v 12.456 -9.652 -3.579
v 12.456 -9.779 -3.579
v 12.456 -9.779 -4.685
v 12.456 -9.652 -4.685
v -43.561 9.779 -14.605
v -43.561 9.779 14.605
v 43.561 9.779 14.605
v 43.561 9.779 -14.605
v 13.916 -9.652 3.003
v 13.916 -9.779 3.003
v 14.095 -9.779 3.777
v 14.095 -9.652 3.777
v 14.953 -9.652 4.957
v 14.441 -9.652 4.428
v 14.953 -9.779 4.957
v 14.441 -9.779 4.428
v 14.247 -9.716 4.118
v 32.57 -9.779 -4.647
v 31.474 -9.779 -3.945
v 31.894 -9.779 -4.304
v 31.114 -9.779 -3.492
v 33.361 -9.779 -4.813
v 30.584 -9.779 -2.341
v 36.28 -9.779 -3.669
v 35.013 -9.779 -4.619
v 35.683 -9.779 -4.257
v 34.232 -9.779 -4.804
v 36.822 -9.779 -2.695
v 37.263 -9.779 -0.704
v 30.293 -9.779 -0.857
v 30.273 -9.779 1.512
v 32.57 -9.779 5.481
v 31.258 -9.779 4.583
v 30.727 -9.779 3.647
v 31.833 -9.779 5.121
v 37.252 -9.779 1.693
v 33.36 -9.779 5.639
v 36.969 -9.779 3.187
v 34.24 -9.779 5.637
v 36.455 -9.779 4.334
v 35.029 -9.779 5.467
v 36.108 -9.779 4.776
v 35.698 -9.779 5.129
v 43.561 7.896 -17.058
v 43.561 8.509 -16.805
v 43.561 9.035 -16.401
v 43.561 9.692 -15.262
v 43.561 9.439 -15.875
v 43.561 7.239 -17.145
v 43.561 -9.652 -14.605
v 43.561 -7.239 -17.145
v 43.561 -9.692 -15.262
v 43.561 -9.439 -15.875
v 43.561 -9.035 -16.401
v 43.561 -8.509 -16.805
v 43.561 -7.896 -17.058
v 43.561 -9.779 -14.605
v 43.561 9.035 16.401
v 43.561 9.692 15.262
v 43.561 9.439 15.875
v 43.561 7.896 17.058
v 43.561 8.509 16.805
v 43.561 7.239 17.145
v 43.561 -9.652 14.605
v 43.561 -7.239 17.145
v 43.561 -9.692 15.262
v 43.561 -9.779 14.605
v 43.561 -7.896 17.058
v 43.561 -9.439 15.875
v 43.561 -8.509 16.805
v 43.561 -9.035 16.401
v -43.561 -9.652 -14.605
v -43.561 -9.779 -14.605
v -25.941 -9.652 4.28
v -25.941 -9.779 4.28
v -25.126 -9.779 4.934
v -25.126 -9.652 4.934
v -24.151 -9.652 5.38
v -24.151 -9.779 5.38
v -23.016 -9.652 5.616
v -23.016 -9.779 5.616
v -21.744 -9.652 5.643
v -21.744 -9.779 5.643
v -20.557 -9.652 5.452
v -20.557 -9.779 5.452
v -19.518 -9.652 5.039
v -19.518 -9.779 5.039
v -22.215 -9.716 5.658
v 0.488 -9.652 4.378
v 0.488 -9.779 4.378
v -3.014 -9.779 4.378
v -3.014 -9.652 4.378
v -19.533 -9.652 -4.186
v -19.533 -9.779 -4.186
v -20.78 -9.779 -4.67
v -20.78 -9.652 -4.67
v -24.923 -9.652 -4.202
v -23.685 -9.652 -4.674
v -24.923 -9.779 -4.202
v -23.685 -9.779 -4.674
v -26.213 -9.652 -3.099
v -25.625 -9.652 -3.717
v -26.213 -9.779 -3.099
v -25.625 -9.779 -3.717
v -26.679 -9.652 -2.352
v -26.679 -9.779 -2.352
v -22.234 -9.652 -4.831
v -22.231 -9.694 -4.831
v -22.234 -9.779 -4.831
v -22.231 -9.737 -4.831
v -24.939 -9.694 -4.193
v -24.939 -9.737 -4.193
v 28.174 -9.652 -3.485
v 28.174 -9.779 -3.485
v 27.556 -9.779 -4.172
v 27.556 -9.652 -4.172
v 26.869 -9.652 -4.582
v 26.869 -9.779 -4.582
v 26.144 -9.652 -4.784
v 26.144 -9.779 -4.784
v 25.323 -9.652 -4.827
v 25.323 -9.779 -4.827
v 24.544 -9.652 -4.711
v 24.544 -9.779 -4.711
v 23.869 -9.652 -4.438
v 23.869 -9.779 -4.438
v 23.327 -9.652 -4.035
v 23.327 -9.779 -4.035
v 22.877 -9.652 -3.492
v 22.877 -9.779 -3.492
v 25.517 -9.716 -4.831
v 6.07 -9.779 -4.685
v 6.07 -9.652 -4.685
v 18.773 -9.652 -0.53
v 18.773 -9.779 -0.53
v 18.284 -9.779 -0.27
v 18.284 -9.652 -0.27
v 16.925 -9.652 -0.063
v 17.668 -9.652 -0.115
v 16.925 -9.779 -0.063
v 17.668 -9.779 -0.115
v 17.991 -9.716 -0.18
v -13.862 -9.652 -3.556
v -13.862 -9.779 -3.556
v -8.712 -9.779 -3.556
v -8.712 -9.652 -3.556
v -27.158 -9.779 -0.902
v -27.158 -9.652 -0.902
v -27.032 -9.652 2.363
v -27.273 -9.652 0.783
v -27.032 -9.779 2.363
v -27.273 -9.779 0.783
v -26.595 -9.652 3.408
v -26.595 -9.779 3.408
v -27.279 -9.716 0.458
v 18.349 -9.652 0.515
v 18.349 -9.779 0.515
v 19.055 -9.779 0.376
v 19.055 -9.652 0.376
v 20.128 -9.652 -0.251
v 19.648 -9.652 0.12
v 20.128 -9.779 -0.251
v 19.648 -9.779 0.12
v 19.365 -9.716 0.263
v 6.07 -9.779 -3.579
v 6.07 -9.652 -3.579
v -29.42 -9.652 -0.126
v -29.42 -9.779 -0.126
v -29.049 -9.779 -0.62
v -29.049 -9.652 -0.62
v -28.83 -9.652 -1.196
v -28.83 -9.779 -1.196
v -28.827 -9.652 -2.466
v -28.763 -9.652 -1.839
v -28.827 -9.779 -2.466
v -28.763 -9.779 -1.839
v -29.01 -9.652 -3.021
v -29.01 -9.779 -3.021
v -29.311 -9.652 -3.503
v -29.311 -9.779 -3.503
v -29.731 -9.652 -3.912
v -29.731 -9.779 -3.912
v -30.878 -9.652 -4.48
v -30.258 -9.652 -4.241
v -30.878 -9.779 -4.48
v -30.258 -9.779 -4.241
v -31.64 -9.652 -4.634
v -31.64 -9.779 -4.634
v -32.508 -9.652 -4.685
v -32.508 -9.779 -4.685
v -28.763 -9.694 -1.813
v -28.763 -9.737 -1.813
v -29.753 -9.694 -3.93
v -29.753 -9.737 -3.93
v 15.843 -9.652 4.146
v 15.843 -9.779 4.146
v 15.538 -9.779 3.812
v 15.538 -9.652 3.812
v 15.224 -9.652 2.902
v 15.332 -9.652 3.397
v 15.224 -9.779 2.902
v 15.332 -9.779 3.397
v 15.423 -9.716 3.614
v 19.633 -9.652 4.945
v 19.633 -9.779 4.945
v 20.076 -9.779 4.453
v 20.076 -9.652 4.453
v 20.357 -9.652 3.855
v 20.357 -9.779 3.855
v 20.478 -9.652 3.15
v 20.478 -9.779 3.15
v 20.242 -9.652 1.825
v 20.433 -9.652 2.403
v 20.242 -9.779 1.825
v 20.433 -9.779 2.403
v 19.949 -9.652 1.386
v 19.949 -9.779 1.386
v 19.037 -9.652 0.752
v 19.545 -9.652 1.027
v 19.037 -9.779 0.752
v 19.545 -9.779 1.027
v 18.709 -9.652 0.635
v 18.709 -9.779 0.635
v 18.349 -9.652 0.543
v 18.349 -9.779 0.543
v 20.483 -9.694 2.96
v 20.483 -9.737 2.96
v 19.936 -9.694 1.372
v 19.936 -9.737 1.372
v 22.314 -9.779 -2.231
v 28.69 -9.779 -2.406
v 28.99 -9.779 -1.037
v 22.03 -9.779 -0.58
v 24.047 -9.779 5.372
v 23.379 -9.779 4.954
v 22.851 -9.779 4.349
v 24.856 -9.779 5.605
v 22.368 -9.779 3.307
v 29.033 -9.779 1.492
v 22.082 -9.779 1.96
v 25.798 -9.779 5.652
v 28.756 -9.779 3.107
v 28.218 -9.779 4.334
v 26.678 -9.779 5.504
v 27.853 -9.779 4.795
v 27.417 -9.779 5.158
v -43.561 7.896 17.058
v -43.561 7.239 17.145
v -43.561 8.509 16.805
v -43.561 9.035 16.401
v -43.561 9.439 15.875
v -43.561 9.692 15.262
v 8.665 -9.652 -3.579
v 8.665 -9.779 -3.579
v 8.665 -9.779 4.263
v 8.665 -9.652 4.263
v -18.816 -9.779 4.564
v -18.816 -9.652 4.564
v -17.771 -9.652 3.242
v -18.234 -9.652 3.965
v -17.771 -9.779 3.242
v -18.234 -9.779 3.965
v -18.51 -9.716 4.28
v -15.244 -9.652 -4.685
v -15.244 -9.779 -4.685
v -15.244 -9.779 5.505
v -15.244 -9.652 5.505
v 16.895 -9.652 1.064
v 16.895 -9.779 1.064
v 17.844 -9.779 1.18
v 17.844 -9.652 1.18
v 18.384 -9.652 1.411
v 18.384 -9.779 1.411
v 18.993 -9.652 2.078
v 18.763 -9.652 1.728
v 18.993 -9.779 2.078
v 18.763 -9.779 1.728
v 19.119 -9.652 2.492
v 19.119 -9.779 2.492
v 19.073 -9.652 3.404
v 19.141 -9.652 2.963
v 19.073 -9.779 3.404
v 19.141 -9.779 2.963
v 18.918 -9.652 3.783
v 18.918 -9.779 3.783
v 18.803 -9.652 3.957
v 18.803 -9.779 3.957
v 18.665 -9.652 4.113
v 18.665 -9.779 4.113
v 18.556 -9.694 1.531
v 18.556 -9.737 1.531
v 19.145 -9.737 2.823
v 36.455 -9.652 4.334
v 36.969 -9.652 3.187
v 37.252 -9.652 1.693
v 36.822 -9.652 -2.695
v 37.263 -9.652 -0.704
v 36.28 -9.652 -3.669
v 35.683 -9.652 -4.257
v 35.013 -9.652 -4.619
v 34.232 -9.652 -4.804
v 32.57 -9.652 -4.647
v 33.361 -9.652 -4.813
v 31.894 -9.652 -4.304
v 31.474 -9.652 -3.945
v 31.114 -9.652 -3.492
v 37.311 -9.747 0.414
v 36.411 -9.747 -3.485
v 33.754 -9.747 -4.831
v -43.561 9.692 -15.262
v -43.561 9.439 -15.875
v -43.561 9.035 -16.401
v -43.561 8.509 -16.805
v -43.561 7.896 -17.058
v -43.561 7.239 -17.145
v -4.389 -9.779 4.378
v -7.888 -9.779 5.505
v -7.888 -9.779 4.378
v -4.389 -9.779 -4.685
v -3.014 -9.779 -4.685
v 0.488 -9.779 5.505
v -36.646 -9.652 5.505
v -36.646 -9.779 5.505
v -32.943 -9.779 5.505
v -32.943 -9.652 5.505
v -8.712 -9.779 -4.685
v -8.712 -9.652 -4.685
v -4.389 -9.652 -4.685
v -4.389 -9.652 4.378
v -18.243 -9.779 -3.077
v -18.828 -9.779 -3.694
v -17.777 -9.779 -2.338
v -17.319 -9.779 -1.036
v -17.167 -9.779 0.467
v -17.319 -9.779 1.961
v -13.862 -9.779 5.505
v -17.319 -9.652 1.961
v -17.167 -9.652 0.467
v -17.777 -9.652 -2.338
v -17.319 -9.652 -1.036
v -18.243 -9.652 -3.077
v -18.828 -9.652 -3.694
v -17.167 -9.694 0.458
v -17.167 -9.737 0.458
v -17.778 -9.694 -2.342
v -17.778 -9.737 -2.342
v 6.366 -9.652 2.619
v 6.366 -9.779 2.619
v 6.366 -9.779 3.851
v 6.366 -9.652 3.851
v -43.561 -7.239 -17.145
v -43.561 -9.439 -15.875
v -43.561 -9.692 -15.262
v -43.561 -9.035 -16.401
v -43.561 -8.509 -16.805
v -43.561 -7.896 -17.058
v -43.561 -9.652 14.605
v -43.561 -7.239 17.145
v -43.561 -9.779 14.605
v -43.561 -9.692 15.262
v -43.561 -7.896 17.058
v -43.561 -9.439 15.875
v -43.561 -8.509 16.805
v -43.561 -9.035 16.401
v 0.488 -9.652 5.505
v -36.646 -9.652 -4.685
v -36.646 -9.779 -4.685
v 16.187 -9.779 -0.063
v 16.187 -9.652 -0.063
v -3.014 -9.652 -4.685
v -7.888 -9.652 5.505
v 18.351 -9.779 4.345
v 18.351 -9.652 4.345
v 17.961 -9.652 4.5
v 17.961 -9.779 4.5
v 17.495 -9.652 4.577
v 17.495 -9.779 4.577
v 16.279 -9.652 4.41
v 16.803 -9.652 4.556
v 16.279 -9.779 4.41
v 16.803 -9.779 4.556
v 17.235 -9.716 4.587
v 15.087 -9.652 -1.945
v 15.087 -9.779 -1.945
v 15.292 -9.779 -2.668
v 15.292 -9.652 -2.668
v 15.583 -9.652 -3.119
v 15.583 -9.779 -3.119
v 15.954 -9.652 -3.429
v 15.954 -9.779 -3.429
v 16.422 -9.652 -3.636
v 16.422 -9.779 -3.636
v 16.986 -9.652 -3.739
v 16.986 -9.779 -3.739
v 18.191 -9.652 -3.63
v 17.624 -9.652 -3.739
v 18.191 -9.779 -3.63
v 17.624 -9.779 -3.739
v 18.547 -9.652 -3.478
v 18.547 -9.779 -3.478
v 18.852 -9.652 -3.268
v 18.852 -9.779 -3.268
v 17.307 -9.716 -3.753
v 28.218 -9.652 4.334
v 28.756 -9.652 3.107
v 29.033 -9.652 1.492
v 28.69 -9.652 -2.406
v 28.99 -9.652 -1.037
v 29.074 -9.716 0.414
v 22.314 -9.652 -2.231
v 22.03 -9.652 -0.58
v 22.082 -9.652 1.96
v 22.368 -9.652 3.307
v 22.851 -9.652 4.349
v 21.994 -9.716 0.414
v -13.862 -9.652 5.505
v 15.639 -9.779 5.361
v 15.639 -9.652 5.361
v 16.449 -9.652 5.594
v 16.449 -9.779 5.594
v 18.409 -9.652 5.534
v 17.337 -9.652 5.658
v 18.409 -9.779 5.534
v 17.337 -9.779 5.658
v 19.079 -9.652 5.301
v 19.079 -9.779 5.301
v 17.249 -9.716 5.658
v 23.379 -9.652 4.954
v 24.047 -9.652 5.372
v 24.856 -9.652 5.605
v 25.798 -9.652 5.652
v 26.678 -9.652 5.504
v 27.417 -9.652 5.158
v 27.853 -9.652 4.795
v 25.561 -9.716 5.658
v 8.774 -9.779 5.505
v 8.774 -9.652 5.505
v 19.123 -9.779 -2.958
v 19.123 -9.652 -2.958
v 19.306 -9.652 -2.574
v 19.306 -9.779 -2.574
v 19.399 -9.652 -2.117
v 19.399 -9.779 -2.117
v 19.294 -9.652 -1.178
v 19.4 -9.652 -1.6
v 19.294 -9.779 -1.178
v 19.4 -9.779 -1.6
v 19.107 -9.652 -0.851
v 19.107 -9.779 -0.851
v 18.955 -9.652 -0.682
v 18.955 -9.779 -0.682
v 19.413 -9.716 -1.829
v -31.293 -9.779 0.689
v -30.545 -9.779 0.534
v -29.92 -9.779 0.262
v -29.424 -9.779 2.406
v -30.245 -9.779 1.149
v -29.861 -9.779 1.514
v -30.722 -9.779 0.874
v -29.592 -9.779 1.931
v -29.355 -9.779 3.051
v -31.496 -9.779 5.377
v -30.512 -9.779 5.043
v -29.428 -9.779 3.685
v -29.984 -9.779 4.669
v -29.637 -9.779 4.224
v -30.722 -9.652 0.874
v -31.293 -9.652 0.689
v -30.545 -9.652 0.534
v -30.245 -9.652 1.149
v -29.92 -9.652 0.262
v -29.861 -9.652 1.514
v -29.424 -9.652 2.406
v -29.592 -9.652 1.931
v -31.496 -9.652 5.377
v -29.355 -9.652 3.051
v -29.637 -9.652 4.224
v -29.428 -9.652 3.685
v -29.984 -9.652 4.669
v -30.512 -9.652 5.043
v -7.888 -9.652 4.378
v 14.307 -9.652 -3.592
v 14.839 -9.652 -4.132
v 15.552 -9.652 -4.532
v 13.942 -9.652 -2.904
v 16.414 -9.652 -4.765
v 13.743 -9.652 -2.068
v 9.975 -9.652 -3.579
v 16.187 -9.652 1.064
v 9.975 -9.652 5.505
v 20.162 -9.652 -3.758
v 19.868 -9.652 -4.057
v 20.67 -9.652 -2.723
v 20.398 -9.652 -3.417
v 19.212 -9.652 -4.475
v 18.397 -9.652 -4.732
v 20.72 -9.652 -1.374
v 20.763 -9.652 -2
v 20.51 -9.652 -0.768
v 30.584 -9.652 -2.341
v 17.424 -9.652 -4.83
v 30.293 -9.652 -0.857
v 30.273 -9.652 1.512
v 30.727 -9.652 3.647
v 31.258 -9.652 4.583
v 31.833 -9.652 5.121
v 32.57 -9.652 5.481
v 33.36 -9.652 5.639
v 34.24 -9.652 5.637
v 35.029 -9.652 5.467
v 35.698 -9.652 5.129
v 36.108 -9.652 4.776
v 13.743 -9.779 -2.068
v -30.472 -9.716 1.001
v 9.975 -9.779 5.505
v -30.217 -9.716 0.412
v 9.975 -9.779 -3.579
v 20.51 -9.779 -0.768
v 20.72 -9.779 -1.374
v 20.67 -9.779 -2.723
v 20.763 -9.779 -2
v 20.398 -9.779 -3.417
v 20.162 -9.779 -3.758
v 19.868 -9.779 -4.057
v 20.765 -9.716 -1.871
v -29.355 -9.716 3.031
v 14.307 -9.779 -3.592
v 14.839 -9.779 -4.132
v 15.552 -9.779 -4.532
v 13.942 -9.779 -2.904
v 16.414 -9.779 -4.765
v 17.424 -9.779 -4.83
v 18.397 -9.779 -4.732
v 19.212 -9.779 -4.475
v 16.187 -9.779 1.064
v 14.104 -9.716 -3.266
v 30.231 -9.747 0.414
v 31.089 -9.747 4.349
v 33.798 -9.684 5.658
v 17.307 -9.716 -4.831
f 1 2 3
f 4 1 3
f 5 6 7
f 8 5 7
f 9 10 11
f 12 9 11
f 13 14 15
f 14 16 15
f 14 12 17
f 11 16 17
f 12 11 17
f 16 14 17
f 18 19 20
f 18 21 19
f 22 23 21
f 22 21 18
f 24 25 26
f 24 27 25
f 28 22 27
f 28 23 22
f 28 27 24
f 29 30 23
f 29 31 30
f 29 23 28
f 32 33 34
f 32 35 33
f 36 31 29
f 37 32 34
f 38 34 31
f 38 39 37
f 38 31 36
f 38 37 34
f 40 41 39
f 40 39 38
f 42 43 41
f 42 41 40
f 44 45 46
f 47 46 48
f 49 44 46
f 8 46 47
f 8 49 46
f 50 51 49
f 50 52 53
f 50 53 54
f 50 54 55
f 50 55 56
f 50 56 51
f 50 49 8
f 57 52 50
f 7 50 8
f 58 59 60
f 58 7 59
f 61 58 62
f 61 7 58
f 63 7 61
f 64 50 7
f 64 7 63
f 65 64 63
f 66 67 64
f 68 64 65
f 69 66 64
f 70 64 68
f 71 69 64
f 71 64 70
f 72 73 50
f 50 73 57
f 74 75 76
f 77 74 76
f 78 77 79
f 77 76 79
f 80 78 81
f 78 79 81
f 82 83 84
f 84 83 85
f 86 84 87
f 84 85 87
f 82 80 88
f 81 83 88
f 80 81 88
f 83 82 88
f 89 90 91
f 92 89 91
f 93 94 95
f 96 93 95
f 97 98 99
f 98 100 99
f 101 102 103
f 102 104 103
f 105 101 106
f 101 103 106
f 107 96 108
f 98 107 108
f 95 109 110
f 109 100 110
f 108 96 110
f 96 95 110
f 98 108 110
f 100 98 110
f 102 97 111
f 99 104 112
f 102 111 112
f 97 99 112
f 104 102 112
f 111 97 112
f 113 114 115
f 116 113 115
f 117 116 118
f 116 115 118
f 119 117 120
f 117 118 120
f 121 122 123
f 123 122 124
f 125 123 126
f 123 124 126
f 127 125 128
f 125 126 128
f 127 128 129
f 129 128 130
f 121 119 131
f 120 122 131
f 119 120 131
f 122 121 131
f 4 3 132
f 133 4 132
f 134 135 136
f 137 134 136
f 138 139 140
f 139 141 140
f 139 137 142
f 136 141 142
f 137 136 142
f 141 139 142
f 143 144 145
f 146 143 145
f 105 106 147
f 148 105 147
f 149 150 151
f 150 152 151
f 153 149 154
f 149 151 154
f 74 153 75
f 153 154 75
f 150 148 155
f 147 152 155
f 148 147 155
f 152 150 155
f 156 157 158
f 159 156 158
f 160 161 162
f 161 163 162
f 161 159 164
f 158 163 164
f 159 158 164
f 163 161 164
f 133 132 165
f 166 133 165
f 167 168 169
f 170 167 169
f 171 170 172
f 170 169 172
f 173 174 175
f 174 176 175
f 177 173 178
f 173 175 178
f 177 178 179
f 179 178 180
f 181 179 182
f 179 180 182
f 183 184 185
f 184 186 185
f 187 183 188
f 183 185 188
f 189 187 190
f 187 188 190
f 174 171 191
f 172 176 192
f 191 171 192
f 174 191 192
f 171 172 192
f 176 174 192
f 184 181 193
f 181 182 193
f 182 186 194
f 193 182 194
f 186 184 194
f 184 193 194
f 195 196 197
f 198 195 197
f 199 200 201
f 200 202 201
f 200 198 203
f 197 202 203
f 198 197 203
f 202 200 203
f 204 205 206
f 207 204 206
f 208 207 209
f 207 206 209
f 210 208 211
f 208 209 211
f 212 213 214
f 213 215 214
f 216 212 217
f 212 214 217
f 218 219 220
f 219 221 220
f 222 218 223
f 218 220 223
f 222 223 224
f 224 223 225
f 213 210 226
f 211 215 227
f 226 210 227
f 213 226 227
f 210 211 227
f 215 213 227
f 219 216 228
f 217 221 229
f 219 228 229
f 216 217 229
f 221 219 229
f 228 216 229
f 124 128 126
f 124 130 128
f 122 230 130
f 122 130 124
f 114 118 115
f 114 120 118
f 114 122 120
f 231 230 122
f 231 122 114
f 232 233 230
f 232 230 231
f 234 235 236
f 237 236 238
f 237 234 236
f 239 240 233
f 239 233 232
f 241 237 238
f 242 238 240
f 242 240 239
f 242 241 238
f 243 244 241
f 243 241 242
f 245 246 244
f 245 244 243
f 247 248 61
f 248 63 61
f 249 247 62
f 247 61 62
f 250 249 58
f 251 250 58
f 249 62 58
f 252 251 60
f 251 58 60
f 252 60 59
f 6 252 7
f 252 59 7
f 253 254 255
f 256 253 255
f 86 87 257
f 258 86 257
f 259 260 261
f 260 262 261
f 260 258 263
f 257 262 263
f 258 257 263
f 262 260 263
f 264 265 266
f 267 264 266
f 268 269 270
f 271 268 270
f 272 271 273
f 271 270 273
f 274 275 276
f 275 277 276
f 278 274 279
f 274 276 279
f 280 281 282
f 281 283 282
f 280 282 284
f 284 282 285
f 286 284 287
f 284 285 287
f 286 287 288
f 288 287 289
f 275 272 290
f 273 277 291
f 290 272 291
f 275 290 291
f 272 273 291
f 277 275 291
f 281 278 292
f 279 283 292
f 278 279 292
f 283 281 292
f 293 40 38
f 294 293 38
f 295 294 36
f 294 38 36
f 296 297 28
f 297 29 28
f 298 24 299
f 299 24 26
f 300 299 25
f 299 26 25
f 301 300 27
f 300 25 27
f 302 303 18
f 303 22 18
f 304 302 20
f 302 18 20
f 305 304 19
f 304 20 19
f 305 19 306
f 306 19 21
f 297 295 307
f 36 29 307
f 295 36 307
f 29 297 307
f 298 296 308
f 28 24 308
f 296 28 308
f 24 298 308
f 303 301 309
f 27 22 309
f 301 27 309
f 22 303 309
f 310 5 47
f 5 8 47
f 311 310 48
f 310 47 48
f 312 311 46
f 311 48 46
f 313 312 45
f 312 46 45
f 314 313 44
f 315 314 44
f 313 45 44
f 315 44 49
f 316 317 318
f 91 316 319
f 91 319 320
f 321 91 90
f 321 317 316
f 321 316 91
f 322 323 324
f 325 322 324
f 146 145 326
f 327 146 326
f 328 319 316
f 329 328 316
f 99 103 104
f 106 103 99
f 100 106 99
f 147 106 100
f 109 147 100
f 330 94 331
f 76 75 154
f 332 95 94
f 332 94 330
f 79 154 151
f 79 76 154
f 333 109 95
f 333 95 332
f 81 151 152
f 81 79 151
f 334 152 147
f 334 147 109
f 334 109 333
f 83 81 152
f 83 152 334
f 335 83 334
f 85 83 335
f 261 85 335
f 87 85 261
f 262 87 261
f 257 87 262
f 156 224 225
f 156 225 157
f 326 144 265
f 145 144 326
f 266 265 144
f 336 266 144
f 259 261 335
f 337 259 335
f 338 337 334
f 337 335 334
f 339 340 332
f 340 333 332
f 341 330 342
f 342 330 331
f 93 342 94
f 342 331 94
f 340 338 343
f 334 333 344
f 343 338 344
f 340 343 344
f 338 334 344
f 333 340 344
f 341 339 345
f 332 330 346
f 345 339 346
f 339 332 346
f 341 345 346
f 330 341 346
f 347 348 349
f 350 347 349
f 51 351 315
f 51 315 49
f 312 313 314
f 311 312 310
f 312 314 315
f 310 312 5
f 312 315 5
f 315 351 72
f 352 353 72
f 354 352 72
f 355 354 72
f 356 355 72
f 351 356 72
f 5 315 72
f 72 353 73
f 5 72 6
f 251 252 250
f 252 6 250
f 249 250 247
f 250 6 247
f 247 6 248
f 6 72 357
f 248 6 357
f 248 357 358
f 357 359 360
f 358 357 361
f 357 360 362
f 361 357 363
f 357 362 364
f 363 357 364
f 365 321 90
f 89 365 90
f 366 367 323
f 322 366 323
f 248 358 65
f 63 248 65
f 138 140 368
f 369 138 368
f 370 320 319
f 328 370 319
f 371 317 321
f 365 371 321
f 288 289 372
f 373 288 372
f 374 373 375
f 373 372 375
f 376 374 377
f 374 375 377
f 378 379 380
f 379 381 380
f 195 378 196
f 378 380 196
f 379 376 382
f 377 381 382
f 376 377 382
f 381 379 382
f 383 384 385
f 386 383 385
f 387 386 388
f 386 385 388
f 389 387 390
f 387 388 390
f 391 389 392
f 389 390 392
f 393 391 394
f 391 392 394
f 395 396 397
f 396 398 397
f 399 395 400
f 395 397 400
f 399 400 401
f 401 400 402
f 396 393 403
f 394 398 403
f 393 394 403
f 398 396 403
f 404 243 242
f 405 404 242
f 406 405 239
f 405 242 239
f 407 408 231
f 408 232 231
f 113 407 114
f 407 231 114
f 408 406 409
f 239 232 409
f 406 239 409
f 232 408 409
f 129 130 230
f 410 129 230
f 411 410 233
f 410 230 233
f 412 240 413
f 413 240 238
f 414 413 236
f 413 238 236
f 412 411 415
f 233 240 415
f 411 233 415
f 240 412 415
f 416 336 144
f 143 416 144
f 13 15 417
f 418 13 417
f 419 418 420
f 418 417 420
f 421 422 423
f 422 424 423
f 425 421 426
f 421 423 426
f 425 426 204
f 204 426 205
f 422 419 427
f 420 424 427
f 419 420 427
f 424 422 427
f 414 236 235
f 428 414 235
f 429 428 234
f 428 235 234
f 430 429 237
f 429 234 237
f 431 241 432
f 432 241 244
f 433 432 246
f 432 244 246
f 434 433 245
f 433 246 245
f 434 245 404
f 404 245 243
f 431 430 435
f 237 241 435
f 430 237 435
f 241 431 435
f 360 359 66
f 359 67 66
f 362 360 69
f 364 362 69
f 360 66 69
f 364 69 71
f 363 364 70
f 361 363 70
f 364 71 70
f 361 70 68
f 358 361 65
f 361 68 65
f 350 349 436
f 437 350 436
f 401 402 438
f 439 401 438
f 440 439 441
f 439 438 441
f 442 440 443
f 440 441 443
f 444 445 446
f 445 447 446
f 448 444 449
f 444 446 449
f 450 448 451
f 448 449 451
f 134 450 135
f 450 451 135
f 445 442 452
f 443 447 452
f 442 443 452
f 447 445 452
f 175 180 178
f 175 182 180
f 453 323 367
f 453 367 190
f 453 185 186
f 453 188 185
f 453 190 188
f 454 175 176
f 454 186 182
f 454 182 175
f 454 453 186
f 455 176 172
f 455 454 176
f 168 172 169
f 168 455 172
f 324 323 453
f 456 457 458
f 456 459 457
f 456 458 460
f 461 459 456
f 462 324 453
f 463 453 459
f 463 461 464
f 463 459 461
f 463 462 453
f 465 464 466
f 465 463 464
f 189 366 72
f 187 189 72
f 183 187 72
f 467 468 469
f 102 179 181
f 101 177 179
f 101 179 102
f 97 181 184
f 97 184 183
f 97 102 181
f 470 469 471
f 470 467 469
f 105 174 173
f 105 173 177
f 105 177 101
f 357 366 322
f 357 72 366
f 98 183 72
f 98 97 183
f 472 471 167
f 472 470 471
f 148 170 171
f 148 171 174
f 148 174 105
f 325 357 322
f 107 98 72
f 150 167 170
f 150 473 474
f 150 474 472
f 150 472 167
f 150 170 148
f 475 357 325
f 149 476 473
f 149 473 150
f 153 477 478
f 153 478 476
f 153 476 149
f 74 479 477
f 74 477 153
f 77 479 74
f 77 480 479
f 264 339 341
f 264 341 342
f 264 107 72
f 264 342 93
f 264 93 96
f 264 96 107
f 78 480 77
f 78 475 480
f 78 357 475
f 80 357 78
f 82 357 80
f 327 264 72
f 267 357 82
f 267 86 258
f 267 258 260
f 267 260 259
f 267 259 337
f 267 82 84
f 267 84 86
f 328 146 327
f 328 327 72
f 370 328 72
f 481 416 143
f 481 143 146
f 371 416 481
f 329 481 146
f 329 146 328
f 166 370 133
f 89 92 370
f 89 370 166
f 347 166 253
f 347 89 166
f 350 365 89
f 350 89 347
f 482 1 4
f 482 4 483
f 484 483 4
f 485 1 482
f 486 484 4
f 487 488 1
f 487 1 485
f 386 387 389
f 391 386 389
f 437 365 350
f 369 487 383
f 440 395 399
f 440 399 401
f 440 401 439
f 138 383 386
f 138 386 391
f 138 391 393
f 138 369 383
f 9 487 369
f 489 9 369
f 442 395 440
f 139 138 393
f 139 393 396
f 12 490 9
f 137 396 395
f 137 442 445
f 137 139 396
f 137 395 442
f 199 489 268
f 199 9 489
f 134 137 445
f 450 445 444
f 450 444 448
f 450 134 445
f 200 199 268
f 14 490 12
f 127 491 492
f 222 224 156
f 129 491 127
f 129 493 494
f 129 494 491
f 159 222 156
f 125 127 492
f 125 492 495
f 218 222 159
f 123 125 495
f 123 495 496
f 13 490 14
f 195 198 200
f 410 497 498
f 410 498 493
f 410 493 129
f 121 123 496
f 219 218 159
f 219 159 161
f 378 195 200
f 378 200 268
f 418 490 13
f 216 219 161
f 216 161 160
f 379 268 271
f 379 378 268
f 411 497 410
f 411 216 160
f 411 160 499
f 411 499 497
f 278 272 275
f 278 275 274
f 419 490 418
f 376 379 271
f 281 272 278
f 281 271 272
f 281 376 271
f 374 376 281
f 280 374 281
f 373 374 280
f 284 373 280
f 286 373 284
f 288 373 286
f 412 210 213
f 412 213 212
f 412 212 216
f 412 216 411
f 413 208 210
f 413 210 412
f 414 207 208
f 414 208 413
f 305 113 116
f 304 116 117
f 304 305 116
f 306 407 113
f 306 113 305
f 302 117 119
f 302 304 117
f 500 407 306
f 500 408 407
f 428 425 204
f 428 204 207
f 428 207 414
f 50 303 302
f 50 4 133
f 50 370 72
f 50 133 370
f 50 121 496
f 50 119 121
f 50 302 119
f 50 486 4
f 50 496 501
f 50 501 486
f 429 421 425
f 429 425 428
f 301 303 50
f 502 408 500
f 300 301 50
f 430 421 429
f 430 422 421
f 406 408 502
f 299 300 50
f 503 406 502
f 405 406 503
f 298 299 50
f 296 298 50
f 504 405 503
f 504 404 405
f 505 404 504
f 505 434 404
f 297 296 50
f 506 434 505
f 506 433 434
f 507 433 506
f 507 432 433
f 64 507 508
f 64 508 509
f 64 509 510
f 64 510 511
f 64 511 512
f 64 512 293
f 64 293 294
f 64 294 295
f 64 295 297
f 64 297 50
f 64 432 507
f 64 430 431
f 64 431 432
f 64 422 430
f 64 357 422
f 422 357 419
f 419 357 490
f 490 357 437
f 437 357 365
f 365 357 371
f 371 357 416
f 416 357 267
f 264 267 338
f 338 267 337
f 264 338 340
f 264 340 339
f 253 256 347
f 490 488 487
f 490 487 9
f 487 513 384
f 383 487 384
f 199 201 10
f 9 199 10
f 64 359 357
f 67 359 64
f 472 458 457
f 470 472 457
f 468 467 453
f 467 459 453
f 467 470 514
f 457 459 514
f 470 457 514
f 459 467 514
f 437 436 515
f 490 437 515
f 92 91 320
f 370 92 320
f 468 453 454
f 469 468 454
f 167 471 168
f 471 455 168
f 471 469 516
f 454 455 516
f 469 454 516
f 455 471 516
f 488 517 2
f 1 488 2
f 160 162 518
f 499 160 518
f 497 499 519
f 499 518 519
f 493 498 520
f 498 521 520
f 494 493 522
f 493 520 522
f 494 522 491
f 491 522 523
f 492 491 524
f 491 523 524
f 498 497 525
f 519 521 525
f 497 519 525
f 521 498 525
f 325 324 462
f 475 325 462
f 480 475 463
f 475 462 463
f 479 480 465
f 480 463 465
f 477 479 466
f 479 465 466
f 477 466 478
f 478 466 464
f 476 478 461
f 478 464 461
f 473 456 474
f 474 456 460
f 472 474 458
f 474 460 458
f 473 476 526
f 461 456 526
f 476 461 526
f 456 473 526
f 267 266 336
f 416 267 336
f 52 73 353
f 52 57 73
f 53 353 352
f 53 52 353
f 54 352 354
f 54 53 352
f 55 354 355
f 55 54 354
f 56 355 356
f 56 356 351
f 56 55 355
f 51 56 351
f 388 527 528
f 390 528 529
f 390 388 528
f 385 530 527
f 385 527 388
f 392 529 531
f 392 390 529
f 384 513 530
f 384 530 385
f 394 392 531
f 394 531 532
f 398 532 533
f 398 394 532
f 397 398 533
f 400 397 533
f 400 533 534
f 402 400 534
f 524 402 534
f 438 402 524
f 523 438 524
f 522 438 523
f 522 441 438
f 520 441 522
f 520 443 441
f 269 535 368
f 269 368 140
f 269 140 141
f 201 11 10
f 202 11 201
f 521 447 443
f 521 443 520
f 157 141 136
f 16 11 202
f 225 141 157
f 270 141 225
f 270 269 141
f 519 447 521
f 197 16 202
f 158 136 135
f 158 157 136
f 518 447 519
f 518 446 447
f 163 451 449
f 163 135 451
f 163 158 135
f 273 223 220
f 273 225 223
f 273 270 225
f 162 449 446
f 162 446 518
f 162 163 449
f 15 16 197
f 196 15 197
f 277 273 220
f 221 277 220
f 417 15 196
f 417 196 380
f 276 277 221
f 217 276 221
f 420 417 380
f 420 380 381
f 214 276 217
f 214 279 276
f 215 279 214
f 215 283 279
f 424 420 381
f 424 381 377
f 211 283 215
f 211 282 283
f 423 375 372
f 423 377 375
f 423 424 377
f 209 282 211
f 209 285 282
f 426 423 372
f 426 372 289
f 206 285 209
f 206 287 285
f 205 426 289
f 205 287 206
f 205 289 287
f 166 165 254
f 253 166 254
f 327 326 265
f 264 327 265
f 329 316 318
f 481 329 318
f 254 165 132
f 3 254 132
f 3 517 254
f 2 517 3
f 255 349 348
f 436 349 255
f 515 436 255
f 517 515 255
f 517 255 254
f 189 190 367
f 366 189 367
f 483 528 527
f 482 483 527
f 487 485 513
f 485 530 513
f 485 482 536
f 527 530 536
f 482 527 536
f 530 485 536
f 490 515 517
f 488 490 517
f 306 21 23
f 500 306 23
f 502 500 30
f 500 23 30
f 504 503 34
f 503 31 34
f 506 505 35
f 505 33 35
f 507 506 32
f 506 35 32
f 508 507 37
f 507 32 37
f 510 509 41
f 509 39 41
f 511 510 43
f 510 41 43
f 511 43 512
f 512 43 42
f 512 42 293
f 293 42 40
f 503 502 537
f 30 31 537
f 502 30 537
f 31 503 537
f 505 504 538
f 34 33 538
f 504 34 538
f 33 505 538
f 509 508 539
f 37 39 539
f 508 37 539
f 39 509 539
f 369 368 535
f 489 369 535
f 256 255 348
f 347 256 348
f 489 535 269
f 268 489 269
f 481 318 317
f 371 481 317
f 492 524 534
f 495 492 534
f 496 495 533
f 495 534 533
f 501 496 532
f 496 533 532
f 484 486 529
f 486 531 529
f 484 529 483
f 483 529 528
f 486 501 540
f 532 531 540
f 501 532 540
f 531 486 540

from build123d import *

# Parameters (mm, degrees)
F0_W     = 87.122
F0_H     = 34.29
F1_DEPTH = 9.779
F2_R     = 2.54
F3_W     = 87.122
F3_H     = 29.21
F4_DEPTH = 0.127


with BuildPart() as f1:
    # F0 (on Front) → F1 (new body, symmetric)
    with BuildSketch(Plane.XZ):
        Rectangle(F0_W, F0_H)
    extrude(amount=F1_DEPTH, both=True)

    # F2
    f2_edges = [f1.edges().sort_by_distance(p)[0] for p in [
        (0, 9.779, 17.145),
        (0, 9.779, -17.145),
        (0, -9.779, 17.145),
        (0, -9.779, -17.145),
    ]]
    fillet(f2_edges, radius=F2_R)

    # F3 (on face) → F4 (cut)
    with BuildSketch(Plane.XZ.offset(9.779)):
        Rectangle(F3_W, F3_H)
        with BuildLine():
            add(Edge.make_bspline(
                [(-29.4201796663, -0.1257045448), (-28.7628641118, -0.7945925563), (-28.7628641118, -1.8129687674)],
                knots=[0, 0, 0, 1, 1, 1], degree=2))
            add(Edge.make_bspline(
                [(-28.7628641118, -1.8129687674), (-28.7628641118, -3.1738897042), (-29.7534664263, -3.9295711427)],
                knots=[0, 0, 0, 1, 1, 1], degree=2))
            add(Edge.make_bspline(
                [(-29.7534664263, -3.9295711427), (-30.7440687408, -4.6852525812), (-32.5077111792, -4.6852525812)],
                knots=[0, 0, 0, 1, 1, 1], degree=2))
            Line((-32.5077111792, -4.6852525812), (-36.6460217827, -4.6852525812))
            Line((-36.6460217827, -4.6852525812), (-36.6460217827, 5.5054530046))
            Line((-36.6460217827, 5.5054530046), (-32.9428355603, 5.5054530046))
            add(Edge.make_bspline(
                [(-32.9428355603, 5.5054530046), (-29.3553739074, 5.5054530046), (-29.3553739074, 3.0312617097)],
                knots=[0, 0, 0, 1, 1, 1], degree=2))
            add(Edge.make_bspline(
                [(-29.3553739074, 3.0312617097), (-29.3553739074, 2.128610068), (-29.8610902759, 1.5141126043)],
                knots=[0, 0, 0, 1, 1, 1], degree=2))
            add(Edge.make_bspline(
                [(-29.8610902759, 1.5141126043), (-30.3668066444, 0.8996151405), (-31.2926032, 0.6889964241)],
                knots=[0, 0, 0, 1, 1, 1], degree=2))
            add(Edge.make_bspline(
                [(-31.2926032, 0.6889964241), (-30.0774952208, 0.5431834666), (-29.4201796663, -0.1257045448)],
                knots=[0, 0, 0, 1, 1, 1], degree=2))
        make_face(mode=Mode.SUBTRACT)
        with BuildLine():
            add(Edge.make_bspline(
                [(-17.7713445055, 3.2418804261), (-17.1672622529, 2.0638043091), (-17.1672622529, 0.4575472852)],
                knots=[0, 0, 0, 1, 1, 1], degree=2))
            add(Edge.make_bspline(
                [(-17.1672622529, 0.4575472852), (-17.1672622529, -1.1417662646), (-17.7782879796, -2.3418300498)],
                knots=[0, 0, 0, 1, 1, 1], degree=2))
            add(Edge.make_bspline(
                [(-17.7782879796, -2.3418300498), (-18.3893137063, -3.541893835), (-19.5326724525, -4.1864796868)],
                knots=[0, 0, 0, 1, 1, 1], degree=2))
            add(Edge.make_bspline(
                [(-19.5326724525, -4.1864796868), (-20.6760311986, -4.8310655387), (-22.2313694121, -4.8310655387)],
                knots=[0, 0, 0, 1, 1, 1], degree=2))
            add(Edge.make_bspline(
                [(-22.2313694121, -4.8310655387), (-23.8005945738, -4.8310655387), (-24.9393243372, -4.193423161)],
                knots=[0, 0, 0, 1, 1, 1], degree=2))
            add(Edge.make_bspline(
                [(-24.9393243372, -4.193423161), (-26.0780541006, -3.5557807833), (-26.678664616, -2.3522452611)],
                knots=[0, 0, 0, 1, 1, 1], degree=2))
            add(Edge.make_bspline(
                [(-26.678664616, -2.3522452611), (-27.2792751315, -1.1487097388), (-27.2792751315, 0.4575472852)],
                knots=[0, 0, 0, 1, 1, 1], degree=2))
            add(Edge.make_bspline(
                [(-27.2792751315, 0.4575472852), (-27.2792751315, 2.901650192), (-25.9414991086, 4.2799298141)],
                knots=[0, 0, 0, 1, 1, 1], degree=2))
            add(Edge.make_bspline(
                [(-25.9414991086, 4.2799298141), (-24.6037230858, 5.6582094363), (-22.2151679723, 5.6582094363)],
                knots=[0, 0, 0, 1, 1, 1], degree=2))
            add(Edge.make_bspline(
                [(-22.2151679723, 5.6582094363), (-20.6598297589, 5.6582094363), (-19.5176282585, 5.0390829897)],
                knots=[0, 0, 0, 1, 1, 1], degree=2))
            add(Edge.make_bspline(
                [(-19.5176282585, 5.0390829897), (-18.375426758, 4.4199565431), (-17.7713445055, 3.2418804261)],
                knots=[0, 0, 0, 1, 1, 1], degree=2))
        make_face(mode=Mode.SUBTRACT)
        Polygon((-8.7124252089, -4.6852525812), (-15.2439199087, -4.6852525812), (-15.2439199087, 5.5054530046), (-13.8621685494, 5.5054530046), (-13.8621685494, -3.5557807833), (-8.7124252089, -3.5557807833), align=None, mode=Mode.SUBTRACT)
        Polygon((0.4876780624, 4.3782956981), (-3.0141474092, 4.3782956981), (-3.0141474092, -4.6852525812), (-4.3889552943, -4.6852525812), (-4.3889552943, 4.3782956981), (-7.8884662744, 4.3782956981), (-7.8884662744, 5.5054530046), (0.4876780624, 5.5054530046), align=None, mode=Mode.SUBTRACT)
        Polygon((12.4559130349, -4.6852525812), (6.0702312926, -4.6852525812), (6.0702312926, -3.5789256972), (8.6647761397, -3.5789256972), (8.6647761397, 4.2625711287), (6.3664861904, 2.6192822425), (6.3664861904, 3.8505916615), (8.773557235, 5.5054530046), (9.9747782659, 5.5054530046), (9.9747782659, -3.5789256972), (12.4559130349, -3.5789256972), align=None, mode=Mode.SUBTRACT)
        with BuildLine():
            add(Edge.make_bspline(
                [(20.1284519894, -0.2506870799), (20.7649371214, -0.894115686), (20.7649371214, -1.8708310521)],
                knots=[0, 0, 0, 1, 1, 1], degree=2))
            add(Edge.make_bspline(
                [(20.7649371214, -1.8708310521), (20.7649371214, -3.2826707994), (19.8680717081, -4.0568681691)],
                knots=[0, 0, 0, 1, 1, 1], degree=2))
            add(Edge.make_bspline(
                [(19.8680717081, -4.0568681691), (18.9712062949, -4.8310655387), (17.3070869862, -4.8310655387)],
                knots=[0, 0, 0, 1, 1, 1], degree=2))
            add(Edge.make_bspline(
                [(17.3070869862, -4.8310655387), (15.7610067384, -4.8310655387), (14.8386819198, -4.1320891392)],
                knots=[0, 0, 0, 1, 1, 1], degree=2))
            add(Edge.make_bspline(
                [(14.8386819198, -4.1320891392), (13.9163571013, -3.4331127397), (13.7427702471, -2.0675628202)],
                knots=[0, 0, 0, 1, 1, 1], degree=2))
            Line((13.7427702471, -2.0675628202), (15.0874897442, -1.9448947766))
            add(Edge.make_bspline(
                [(15.0874897442, -1.9448947766), (15.3490272711, -3.7525125514), (17.3070869862, -3.7525125514)],
                knots=[0, 0, 0, 1, 1, 1], degree=2))
            add(Edge.make_bspline(
                [(17.3070869862, -3.7525125514), (18.2907458265, -3.7525125514), (18.8520099884, -3.2676266054)],
                knots=[0, 0, 0, 1, 1, 1], degree=2))
            add(Edge.make_bspline(
                [(18.8520099884, -3.2676266054), (19.4132741502, -2.7827406594), (19.4132741502, -1.8291702071)],
                knots=[0, 0, 0, 1, 1, 1], degree=2))
            add(Edge.make_bspline(
                [(19.4132741502, -1.8291702071), (19.4132741502, -0.9959533071), (18.7733172811, -0.5295832922)],
                knots=[0, 0, 0, 1, 1, 1], degree=2))
            add(Edge.make_bspline(
                [(18.7733172811, -0.5295832922), (18.1333604121, -0.0632132773), (16.925195907, -0.0632132773)],
                knots=[0, 0, 0, 1, 1, 1], degree=2))
            Line((16.925195907, -0.0632132773), (16.1868731539, -0.0632132773))
            Line((16.1868731539, -0.0632132773), (16.1868731539, 1.0639440291))
            Line((16.1868731539, 1.0639440291), (16.895107519, 1.0639440291))
            add(Edge.make_bspline(
                [(16.895107519, 1.0639440291), (17.9667170321, 1.0639440291), (18.5557550906, 1.5314712897)],
                knots=[0, 0, 0, 1, 1, 1], degree=2))
            add(Edge.make_bspline(
                [(18.5557550906, 1.5314712897), (19.1447931491, 1.9989985503), (19.1447931491, 2.8229574847)],
                knots=[0, 0, 0, 1, 1, 1], degree=2))
            add(Edge.make_bspline(
                [(19.1447931491, 2.8229574847), (19.1447931491, 3.6399729451), (18.6645361859, 4.1132864341)],
                knots=[0, 0, 0, 1, 1, 1], degree=2))
            add(Edge.make_bspline(
                [(18.6645361859, 4.1132864341), (18.1842792226, 4.5865999232), (17.2353377531, 4.5865999232)],
                knots=[0, 0, 0, 1, 1, 1], degree=2))
            add(Edge.make_bspline(
                [(17.2353377531, 4.5865999232), (16.3743469564, 4.5865999232), (15.8431711827, 4.1456893136)],
                knots=[0, 0, 0, 1, 1, 1], degree=2))
            add(Edge.make_bspline(
                [(15.8431711827, 4.1456893136), (15.3119954089, 3.7047787039), (15.2240447361, 2.901650192)],
                knots=[0, 0, 0, 1, 1, 1], degree=2))
            Line((15.2240447361, 2.901650192), (13.9163571013, 3.0034878131))
            add(Edge.make_bspline(
                [(13.9163571013, 3.0034878131), (14.0598555674, 4.2556276545), (14.9532492436, 4.9569185454)],
                knots=[0, 0, 0, 1, 1, 1], degree=2))
            add(Edge.make_bspline(
                [(14.9532492436, 4.9569185454), (15.8466429197, 5.6582094363), (17.2492247015, 5.6582094363)],
                knots=[0, 0, 0, 1, 1, 1], degree=2))
            add(Edge.make_bspline(
                [(17.2492247015, 5.6582094363), (18.7837324924, 5.6582094363), (19.6331508322, 4.9453460885)],
                knots=[0, 0, 0, 1, 1, 1], degree=2))
            add(Edge.make_bspline(
                [(19.6331508322, 4.9453460885), (20.4825691719, 4.2324827406), (20.4825691719, 2.9595124767)],
                knots=[0, 0, 0, 1, 1, 1], degree=2))
            add(Edge.make_bspline(
                [(20.4825691719, 2.9595124767), (20.4825691719, 1.9827971105), (19.9363492041, 1.3717713838)],
                knots=[0, 0, 0, 1, 1, 1], degree=2))
            add(Edge.make_bspline(
                [(19.9363492041, 1.3717713838), (19.3901292363, 0.7607456571), (18.3486081113, 0.5431834666)],
                knots=[0, 0, 0, 1, 1, 1], degree=2))
            Line((18.3486081113, 0.5431834666), (18.3486081113, 0.5154095699))
            add(Edge.make_bspline(
                [(18.3486081113, 0.5154095699), (19.4919668574, 0.3927415263), (20.1284519894, -0.2506870799)],
                knots=[0, 0, 0, 1, 1, 1], degree=2))
        make_face(mode=Mode.SUBTRACT)
        with BuildLine():
            add(Edge.make_bspline(
                [(28.2175993939, 4.3343203618), (29.0739612079, 3.0104312872), (29.0739612079, 0.4135719488)],
                knots=[0, 0, 0, 1, 1, 1], degree=2))
            add(Edge.make_bspline(
                [(29.0739612079, 0.4135719488), (29.0739612079, -2.1393120533), (28.1736240576, -3.485188796)],
                knots=[0, 0, 0, 1, 1, 1], degree=2))
            add(Edge.make_bspline(
                [(28.1736240576, -3.485188796), (27.2732869072, -4.8310655387), (25.516587943, -4.8310655387)],
                knots=[0, 0, 0, 1, 1, 1], degree=2))
            add(Edge.make_bspline(
                [(25.516587943, -4.8310655387), (23.7598889787, -4.8310655387), (22.8769105138, -3.4921322701)],
                knots=[0, 0, 0, 1, 1, 1], degree=2))
            add(Edge.make_bspline(
                [(22.8769105138, -3.4921322701), (21.9939320489, -2.1531990016), (21.9939320489, 0.4135719488)],
                knots=[0, 0, 0, 1, 1, 1], degree=2))
            add(Edge.make_bspline(
                [(21.9939320489, 0.4135719488), (21.9939320489, 3.0405196753), (22.8514511086, 4.3493645558)],
                knots=[0, 0, 0, 1, 1, 1], degree=2))
            add(Edge.make_bspline(
                [(22.8514511086, 4.3493645558), (23.7089701682, 5.6582094363), (25.5605632794, 5.6582094363)],
                knots=[0, 0, 0, 1, 1, 1], degree=2))
            add(Edge.make_bspline(
                [(25.5605632794, 5.6582094363), (27.36123758, 5.6582094363), (28.2175993939, 4.3343203618)],
                knots=[0, 0, 0, 1, 1, 1], degree=2))
        make_face(mode=Mode.SUBTRACT)
        with BuildLine():
            add(Edge.make_bspline(
                [(36.4548742474, 4.3343203618), (37.3112360613, 3.0104312872), (37.3112360613, 0.4135719488)],
                knots=[0, 0, 0, 1, 1, 1], degree=2))
            add(Edge.make_bspline(
                [(37.3112360613, 0.4135719488), (37.3112360613, -2.1393120533), (36.410898911, -3.485188796)],
                knots=[0, 0, 0, 1, 1, 1], degree=2))
            add(Edge.make_bspline(
                [(36.410898911, -3.485188796), (35.5105617607, -4.8310655387), (33.7538627964, -4.8310655387)],
                knots=[0, 0, 0, 1, 1, 1], degree=2))
            add(Edge.make_bspline(
                [(33.7538627964, -4.8310655387), (31.9971638322, -4.8310655387), (31.1141853673, -3.4921322701)],
                knots=[0, 0, 0, 1, 1, 1], degree=2))
            add(Edge.make_bspline(
                [(31.1141853673, -3.4921322701), (30.2312069024, -2.1531990016), (30.2312069024, 0.4135719488)],
                knots=[0, 0, 0, 1, 1, 1], degree=2))
            add(Edge.make_bspline(
                [(30.2312069024, 0.4135719488), (30.2312069024, 3.0405196753), (31.088725962, 4.3493645558)],
                knots=[0, 0, 0, 1, 1, 1], degree=2))
            add(Edge.make_bspline(
                [(31.088725962, 4.3493645558), (31.9462450216, 5.6582094363), (33.7978381328, 5.6582094363)],
                knots=[0, 0, 0, 1, 1, 1], degree=2))
            add(Edge.make_bspline(
                [(33.7978381328, 5.6582094363), (35.5985124335, 5.6582094363), (36.4548742474, 4.3343203618)],
                knots=[0, 0, 0, 1, 1, 1], degree=2))
        make_face(mode=Mode.SUBTRACT)
    extrude(amount=-F4_DEPTH, mode=Mode.SUBTRACT)


solid = f1.part
